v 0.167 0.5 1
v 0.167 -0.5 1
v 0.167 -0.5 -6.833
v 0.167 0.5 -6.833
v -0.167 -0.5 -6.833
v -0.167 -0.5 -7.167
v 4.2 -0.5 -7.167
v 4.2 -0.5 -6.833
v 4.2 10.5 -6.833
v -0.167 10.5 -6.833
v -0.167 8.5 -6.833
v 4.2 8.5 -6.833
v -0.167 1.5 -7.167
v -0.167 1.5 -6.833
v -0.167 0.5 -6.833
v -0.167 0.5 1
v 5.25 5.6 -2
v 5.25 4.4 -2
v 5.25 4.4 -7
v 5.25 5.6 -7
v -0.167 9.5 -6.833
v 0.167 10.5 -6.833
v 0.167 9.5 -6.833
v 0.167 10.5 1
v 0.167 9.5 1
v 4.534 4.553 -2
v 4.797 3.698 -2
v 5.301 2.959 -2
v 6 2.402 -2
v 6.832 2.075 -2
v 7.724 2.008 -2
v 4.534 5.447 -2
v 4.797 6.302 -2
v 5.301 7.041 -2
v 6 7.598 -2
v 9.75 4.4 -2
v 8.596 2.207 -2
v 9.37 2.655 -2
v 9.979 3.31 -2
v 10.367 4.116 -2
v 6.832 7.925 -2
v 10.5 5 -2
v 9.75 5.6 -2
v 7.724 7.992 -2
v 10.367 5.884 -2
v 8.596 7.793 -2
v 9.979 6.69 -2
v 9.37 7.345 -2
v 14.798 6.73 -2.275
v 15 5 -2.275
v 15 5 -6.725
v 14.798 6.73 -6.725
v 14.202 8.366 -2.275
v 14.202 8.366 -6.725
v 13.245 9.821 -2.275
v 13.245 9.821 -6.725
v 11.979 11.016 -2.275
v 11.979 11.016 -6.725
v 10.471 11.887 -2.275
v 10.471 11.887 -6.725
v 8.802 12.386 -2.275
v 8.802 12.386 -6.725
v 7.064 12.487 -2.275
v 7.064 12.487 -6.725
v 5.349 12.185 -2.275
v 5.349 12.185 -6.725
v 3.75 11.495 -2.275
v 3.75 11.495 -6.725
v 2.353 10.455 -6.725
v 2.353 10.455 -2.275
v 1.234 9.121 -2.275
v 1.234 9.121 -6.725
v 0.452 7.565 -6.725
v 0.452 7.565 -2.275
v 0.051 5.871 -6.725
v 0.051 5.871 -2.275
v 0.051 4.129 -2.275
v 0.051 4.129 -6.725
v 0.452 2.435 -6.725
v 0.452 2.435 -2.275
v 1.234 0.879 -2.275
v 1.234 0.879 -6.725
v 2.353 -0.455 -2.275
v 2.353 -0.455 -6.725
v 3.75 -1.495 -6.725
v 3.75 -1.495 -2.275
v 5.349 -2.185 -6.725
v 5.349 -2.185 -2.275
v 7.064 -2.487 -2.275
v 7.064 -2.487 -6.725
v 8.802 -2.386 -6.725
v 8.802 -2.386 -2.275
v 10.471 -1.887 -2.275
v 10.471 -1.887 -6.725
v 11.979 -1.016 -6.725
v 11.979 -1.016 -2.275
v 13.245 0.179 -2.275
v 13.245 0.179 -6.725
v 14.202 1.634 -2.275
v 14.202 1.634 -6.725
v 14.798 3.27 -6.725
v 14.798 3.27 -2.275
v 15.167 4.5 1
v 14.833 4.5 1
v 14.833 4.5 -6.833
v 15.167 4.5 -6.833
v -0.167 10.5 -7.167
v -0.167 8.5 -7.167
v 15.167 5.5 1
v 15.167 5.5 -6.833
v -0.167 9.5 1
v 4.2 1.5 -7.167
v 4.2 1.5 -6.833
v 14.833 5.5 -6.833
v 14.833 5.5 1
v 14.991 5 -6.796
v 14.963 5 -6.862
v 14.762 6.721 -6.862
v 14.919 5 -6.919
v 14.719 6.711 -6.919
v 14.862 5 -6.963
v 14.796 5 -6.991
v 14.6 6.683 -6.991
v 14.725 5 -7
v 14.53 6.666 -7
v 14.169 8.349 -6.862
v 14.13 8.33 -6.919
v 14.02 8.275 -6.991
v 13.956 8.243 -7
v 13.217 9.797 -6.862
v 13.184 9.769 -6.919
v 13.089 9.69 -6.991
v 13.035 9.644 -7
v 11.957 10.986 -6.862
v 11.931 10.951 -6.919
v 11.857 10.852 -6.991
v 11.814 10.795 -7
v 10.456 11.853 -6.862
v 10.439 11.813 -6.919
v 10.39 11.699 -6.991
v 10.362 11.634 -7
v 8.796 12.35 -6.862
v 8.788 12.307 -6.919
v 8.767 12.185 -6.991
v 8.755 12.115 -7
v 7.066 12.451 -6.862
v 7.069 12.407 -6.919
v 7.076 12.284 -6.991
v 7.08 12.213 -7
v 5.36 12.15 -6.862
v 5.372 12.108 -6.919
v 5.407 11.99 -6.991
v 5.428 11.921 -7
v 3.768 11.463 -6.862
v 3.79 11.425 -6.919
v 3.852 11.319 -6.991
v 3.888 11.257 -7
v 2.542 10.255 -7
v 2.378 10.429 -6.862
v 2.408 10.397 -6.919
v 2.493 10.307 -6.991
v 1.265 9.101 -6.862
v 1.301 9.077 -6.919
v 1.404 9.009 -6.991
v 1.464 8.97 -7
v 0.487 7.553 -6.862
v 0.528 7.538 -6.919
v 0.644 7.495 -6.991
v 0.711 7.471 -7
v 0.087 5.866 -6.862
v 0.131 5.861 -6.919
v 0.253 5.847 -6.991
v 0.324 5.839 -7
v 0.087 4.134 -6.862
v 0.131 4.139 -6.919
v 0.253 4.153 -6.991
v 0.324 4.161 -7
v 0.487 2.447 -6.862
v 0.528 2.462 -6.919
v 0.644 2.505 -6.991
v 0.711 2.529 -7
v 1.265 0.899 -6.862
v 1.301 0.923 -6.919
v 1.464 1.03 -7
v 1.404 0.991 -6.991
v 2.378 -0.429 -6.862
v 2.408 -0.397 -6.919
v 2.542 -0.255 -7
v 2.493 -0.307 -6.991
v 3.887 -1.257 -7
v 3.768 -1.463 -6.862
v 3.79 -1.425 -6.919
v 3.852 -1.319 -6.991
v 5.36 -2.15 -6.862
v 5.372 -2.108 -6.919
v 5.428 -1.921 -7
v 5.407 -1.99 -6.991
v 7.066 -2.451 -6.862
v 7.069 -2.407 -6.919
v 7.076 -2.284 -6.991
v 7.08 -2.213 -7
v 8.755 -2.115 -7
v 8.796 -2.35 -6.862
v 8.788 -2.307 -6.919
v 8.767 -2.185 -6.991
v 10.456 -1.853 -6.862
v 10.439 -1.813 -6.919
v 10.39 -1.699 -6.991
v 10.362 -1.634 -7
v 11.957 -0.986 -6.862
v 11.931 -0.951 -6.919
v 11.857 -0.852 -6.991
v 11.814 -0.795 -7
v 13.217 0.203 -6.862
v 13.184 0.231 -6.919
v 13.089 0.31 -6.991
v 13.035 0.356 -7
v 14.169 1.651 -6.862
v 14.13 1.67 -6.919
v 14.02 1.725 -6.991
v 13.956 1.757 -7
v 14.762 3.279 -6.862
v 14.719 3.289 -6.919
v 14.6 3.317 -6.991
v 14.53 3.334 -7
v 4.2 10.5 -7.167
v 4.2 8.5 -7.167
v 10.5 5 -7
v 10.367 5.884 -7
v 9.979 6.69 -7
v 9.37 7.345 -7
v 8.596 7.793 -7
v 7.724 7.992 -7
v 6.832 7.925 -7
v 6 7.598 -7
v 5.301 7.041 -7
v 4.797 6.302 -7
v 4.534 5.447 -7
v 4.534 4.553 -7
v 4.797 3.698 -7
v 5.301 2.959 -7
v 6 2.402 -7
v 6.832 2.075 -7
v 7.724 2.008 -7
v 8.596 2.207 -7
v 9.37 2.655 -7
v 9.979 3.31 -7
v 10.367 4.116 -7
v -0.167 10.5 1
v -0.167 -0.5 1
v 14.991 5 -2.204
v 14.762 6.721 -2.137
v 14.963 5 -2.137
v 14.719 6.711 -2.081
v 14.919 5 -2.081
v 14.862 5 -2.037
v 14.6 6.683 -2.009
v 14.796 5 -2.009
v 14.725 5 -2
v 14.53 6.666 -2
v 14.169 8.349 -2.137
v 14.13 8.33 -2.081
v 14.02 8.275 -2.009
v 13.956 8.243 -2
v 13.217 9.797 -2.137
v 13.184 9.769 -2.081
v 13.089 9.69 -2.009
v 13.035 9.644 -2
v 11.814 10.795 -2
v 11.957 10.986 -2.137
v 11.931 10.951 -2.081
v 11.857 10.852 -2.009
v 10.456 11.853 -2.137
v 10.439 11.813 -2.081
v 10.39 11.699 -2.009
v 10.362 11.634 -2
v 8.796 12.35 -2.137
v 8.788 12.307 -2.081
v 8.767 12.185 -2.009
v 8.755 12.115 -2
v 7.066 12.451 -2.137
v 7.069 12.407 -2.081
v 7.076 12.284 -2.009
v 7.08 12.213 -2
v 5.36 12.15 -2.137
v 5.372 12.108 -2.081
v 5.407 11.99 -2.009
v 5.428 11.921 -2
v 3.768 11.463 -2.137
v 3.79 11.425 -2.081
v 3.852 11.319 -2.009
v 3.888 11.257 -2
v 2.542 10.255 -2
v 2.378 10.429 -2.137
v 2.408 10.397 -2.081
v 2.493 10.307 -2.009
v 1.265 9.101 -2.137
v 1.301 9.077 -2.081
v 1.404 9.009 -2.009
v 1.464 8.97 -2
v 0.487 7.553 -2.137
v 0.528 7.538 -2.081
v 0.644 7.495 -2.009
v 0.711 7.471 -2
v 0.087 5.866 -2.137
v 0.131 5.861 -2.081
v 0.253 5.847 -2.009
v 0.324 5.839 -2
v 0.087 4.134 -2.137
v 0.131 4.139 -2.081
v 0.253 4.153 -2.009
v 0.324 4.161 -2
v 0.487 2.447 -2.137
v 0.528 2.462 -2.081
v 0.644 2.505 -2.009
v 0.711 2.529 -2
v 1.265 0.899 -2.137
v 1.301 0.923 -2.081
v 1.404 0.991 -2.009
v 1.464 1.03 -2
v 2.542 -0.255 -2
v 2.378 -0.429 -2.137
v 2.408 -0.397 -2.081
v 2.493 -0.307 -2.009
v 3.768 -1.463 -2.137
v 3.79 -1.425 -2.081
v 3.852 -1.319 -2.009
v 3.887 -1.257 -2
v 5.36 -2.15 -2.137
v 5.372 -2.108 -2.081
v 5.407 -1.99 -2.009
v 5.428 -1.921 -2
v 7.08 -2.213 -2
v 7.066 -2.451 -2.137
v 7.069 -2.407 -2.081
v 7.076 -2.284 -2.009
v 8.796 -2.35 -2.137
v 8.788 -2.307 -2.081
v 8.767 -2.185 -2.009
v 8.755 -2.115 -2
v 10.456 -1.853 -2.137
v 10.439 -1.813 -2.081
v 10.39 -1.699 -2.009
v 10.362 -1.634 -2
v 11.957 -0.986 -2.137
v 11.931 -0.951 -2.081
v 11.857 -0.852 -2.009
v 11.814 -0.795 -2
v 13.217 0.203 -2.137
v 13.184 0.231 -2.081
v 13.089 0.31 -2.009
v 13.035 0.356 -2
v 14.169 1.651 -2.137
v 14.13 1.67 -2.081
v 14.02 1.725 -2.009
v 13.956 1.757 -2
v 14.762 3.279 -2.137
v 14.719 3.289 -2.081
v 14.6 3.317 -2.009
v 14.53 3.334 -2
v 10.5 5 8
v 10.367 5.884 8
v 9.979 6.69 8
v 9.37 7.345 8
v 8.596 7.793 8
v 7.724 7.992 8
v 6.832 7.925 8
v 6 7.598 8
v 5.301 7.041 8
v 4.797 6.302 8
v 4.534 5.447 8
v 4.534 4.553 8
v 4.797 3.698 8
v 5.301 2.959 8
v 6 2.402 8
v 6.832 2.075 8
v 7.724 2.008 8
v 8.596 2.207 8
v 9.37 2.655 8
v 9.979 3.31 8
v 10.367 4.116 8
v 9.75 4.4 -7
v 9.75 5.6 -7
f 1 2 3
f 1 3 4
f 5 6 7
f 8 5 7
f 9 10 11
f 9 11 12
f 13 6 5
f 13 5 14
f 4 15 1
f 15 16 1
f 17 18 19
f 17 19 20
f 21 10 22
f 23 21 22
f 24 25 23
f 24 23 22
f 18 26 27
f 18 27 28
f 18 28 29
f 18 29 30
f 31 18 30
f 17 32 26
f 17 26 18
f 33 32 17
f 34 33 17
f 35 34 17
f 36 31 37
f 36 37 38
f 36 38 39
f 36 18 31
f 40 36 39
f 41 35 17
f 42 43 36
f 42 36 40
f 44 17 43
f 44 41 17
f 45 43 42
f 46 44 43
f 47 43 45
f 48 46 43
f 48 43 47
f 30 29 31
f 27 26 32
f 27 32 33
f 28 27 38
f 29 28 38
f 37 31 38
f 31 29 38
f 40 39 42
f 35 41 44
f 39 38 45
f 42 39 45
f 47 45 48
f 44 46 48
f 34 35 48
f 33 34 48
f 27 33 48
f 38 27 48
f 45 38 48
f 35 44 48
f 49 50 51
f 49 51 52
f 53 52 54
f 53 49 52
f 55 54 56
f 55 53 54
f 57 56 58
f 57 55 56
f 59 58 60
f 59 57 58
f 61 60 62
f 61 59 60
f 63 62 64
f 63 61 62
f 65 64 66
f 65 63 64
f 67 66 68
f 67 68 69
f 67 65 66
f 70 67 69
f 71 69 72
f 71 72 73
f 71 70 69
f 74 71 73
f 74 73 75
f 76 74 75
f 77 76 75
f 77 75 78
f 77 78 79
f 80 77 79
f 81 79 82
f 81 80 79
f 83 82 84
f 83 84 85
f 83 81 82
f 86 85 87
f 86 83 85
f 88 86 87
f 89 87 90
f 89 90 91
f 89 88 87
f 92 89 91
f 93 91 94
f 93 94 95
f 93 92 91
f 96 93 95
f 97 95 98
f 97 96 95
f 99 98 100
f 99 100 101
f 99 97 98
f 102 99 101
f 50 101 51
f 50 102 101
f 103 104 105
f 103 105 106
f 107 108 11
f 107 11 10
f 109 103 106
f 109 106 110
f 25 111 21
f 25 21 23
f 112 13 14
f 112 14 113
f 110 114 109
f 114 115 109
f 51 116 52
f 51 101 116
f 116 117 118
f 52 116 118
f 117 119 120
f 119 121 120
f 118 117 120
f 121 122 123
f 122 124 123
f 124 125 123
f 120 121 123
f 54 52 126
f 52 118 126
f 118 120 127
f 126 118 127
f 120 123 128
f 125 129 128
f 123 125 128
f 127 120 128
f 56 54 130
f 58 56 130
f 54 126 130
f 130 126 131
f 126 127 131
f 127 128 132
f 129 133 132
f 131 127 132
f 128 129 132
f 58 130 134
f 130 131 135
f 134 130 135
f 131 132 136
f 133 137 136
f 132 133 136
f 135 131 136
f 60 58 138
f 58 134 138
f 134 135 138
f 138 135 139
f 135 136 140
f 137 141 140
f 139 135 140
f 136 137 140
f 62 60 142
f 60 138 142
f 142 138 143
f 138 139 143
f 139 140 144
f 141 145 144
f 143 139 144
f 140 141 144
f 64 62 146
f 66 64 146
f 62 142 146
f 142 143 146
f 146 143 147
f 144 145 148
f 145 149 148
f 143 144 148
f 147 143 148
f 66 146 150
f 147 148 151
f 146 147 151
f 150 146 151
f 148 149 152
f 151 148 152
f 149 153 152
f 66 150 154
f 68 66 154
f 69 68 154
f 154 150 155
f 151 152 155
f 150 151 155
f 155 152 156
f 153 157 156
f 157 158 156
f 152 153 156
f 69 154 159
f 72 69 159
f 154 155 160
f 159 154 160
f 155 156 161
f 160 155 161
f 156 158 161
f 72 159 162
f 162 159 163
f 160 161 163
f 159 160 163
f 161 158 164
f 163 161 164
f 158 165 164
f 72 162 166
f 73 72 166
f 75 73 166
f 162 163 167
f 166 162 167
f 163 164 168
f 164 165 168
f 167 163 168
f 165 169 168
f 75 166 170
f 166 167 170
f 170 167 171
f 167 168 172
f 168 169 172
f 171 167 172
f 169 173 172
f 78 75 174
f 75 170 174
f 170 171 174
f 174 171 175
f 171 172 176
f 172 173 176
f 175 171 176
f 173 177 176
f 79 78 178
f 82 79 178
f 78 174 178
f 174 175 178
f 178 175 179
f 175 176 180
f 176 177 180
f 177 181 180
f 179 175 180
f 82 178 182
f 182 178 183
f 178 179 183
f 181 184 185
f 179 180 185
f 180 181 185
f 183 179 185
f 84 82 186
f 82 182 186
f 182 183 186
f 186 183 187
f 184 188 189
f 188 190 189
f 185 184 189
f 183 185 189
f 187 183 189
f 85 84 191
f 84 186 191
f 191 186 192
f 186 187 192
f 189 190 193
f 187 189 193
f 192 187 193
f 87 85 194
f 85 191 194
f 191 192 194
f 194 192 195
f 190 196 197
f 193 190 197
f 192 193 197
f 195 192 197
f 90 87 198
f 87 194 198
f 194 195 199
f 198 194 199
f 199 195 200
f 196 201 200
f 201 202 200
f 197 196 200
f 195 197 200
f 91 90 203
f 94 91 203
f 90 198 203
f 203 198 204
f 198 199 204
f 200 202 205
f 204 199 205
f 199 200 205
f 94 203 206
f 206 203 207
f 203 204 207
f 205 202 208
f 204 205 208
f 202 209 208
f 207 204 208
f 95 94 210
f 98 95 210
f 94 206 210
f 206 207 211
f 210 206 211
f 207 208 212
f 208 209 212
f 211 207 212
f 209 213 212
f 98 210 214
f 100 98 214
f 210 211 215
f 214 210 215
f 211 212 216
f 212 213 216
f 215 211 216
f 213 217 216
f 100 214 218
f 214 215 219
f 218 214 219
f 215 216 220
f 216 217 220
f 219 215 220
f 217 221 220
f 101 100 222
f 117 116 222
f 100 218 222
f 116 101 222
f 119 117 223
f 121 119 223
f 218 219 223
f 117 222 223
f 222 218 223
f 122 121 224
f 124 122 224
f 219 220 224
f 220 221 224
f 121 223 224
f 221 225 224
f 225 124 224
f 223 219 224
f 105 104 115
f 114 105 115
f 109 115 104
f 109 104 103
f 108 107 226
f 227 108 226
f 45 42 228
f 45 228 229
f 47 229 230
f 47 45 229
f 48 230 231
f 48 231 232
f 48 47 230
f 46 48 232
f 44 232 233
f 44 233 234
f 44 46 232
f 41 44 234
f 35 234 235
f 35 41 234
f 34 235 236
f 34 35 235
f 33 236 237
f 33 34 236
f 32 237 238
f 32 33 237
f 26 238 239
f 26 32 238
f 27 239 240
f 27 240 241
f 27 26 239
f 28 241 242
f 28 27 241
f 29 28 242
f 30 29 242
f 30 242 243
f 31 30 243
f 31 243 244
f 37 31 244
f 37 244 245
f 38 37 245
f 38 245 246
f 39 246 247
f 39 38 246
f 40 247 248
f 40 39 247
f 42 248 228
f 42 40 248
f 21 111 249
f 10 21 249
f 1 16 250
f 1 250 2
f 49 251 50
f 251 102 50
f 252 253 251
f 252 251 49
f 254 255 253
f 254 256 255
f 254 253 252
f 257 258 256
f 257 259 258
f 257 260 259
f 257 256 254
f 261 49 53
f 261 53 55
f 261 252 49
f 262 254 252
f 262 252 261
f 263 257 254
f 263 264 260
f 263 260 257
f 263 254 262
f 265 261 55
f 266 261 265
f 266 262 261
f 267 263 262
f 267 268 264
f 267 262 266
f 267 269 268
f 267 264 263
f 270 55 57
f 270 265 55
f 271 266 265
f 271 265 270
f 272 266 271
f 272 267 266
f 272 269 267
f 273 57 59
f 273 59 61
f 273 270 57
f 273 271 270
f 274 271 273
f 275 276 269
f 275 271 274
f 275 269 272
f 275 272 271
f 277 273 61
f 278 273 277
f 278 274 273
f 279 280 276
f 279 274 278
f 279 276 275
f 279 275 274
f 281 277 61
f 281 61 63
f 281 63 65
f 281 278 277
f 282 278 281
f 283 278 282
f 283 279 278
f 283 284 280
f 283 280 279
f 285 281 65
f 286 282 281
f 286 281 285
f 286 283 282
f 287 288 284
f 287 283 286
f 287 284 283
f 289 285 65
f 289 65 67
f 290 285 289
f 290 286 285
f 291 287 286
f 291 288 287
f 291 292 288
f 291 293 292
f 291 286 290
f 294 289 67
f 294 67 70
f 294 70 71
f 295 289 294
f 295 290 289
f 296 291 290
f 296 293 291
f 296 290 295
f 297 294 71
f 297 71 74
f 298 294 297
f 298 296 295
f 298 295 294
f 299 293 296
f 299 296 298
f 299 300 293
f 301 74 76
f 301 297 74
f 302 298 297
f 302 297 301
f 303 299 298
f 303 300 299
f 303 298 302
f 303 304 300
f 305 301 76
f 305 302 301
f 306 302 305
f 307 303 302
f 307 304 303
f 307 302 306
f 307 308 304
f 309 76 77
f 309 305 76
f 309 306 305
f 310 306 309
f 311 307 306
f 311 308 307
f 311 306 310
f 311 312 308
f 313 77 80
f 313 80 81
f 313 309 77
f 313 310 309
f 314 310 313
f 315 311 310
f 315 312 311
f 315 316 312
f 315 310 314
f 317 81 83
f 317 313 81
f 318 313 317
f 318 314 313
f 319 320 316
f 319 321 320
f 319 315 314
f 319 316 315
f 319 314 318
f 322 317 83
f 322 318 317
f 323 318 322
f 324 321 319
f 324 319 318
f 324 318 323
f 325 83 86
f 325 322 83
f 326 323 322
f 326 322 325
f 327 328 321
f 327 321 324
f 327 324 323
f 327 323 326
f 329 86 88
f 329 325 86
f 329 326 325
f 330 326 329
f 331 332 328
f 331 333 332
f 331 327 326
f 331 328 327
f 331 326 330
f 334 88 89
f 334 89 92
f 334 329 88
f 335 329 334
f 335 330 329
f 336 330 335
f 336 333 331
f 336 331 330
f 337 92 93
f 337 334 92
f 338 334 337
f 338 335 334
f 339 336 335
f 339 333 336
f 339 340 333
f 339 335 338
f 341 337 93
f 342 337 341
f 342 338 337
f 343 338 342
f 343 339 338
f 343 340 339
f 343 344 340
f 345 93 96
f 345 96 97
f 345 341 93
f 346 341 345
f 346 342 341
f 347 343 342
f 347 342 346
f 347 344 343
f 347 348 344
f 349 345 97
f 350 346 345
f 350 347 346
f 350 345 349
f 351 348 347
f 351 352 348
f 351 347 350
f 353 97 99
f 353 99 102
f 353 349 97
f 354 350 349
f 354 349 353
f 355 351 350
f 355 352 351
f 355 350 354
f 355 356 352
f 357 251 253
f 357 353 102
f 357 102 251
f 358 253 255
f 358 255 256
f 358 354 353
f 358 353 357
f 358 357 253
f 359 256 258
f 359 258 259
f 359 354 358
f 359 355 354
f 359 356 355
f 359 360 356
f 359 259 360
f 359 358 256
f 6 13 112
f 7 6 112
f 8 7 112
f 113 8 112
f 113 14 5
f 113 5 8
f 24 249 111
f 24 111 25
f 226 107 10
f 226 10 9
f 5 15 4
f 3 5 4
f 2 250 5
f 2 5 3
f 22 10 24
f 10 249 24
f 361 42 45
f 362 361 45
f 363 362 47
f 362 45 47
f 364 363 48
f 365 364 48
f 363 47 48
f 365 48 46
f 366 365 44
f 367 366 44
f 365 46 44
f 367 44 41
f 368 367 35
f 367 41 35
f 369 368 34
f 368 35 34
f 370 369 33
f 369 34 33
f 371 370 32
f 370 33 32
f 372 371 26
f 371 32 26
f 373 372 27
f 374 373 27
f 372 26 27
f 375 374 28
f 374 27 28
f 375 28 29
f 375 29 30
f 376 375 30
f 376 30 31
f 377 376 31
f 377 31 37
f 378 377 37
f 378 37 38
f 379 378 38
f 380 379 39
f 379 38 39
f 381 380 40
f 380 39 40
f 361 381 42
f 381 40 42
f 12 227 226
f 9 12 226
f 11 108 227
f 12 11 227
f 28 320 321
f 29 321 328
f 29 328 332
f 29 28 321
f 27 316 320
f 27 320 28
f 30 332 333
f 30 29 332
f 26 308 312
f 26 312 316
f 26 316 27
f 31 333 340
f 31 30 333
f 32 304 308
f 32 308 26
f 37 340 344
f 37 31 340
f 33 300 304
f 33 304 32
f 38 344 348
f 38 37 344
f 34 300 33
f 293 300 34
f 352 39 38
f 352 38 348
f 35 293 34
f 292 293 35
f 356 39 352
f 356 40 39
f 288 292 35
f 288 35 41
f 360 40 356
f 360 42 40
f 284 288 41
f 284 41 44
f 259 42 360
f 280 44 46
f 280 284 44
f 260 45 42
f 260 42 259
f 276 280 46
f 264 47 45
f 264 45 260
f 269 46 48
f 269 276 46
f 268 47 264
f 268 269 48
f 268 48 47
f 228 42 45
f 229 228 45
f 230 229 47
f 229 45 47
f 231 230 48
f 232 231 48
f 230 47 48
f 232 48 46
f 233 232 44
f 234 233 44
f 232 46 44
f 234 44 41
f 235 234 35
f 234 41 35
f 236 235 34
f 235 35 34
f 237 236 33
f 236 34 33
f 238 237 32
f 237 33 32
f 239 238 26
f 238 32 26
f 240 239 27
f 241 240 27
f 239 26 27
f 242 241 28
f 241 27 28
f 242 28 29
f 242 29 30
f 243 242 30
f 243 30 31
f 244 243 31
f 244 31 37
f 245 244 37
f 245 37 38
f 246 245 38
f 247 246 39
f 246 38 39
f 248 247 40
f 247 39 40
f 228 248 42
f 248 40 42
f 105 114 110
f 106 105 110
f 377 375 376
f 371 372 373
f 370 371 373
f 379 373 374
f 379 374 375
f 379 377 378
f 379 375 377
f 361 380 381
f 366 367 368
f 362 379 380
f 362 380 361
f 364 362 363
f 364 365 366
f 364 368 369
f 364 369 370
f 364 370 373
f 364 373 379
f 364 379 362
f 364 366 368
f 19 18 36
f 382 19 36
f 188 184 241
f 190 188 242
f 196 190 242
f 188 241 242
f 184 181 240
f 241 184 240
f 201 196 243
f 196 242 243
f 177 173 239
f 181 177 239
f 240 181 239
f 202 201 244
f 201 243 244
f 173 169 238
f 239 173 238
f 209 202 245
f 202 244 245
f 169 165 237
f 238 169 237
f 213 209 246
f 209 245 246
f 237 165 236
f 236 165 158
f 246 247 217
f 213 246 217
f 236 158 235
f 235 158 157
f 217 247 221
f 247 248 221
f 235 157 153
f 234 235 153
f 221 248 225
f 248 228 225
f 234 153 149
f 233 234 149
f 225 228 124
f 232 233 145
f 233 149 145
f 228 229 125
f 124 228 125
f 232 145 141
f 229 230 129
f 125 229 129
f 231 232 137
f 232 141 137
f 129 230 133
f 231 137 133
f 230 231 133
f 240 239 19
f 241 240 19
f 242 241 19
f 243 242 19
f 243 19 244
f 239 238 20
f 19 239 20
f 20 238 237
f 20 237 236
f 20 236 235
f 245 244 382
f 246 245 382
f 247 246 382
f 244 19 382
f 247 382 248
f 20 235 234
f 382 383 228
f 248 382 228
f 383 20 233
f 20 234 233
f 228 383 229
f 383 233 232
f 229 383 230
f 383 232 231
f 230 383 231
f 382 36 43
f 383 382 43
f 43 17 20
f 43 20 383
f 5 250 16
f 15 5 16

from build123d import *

# Parameters (mm, degrees)
SKETCH003_W       = 0.333334
SKETCH003_H       = 1
PAD002_DEPTH      = 1
PAD002_DEPTH_BACK = 6.833333
SKETCH004_R       = 3
SKETCH004_W       = 4.5
SKETCH004_H       = 1.2
PAD003_DEPTH      = 5
SKETCH_R          = 7.5
SKETCH_R_2        = 3
PAD_DEPTH         = 5
FILLET_R          = 0.275
SKETCH005_W       = 4.366667
SKETCH005_H       = 2
PAD004_DEPTH      = 0.333333
SKETCH006_R       = 3
PAD005_DEPTH      = 10


with BuildPart() as pad002:
    # Sketch003 → Pad002 (new body, two sides)
    with BuildSketch(Plane(origin=(0, 10, 0), x_dir=(1, 0, 0), z_dir=(0, 0, 1))) as pad002_sk:
        Rectangle(SKETCH003_W, SKETCH003_H)
        with Locations((15, -5)):
            Rectangle(SKETCH003_W, SKETCH003_H)
        with Locations((0, -10)):
            Rectangle(SKETCH003_W, SKETCH003_H)
    extrude(amount=PAD002_DEPTH)
    extrude(pad002_sk.sketch, amount=-PAD002_DEPTH_BACK)


with BuildPart() as pad003:
    # Sketch004 → Pad003 (new body)
    with BuildSketch(Plane(origin=(0, 10, -2), x_dir=(1, 0, 0), z_dir=(0, 0, 1))):
        with Locations((7.5, -5)):
            Circle(SKETCH004_R)
        with Locations((7.5, -5)):
            Rectangle(SKETCH004_W, SKETCH004_H, mode=Mode.SUBTRACT)
    extrude(amount=-PAD003_DEPTH)


with BuildPart() as fillet_body:
    # Sketch → Pad (new body)
    with BuildSketch(Plane(origin=(0, 10, -2), x_dir=(1, 0, 0), z_dir=(0, 0, 1))):
        with Locations((7.5, -5)):
            Circle(SKETCH_R)
        with Locations((7.5, -5)):
            Circle(SKETCH_R_2, mode=Mode.SUBTRACT)
    extrude(amount=-PAD_DEPTH)

    # Fillet
    fillet_edges = [fillet_body.edges().sort_by_distance(p)[0] for p in [
        (0, 5, -2),
        (0, 5, -7),
    ]]
    fillet(fillet_edges, radius=FILLET_R)


with BuildPart() as pad004:
    # Sketch005 → Pad004 (new body)
    with BuildSketch(Plane(origin=(0, 10, -7.166667), x_dir=(1, 0, 0), z_dir=(0, 0, 1))):
        with Locations((2.016666, -0.5)):
            Rectangle(SKETCH005_W, SKETCH005_H)
        with Locations((2.016666, -9.5)):
            Rectangle(SKETCH005_W, SKETCH005_H)
    extrude(amount=PAD004_DEPTH)


with BuildPart() as pad005:
    # Sketch006 → Pad005 (new body)
    with BuildSketch(Plane(origin=(0, 10, -2), x_dir=(1, 0, 0), z_dir=(0, 0, 1))):
        with Locations((7.5, -5)):
            Circle(SKETCH006_R)
    extrude(amount=PAD005_DEPTH)


solid = Compound([pad002.part, pad003.part, fillet_body.part, pad004.part, pad005.part])
